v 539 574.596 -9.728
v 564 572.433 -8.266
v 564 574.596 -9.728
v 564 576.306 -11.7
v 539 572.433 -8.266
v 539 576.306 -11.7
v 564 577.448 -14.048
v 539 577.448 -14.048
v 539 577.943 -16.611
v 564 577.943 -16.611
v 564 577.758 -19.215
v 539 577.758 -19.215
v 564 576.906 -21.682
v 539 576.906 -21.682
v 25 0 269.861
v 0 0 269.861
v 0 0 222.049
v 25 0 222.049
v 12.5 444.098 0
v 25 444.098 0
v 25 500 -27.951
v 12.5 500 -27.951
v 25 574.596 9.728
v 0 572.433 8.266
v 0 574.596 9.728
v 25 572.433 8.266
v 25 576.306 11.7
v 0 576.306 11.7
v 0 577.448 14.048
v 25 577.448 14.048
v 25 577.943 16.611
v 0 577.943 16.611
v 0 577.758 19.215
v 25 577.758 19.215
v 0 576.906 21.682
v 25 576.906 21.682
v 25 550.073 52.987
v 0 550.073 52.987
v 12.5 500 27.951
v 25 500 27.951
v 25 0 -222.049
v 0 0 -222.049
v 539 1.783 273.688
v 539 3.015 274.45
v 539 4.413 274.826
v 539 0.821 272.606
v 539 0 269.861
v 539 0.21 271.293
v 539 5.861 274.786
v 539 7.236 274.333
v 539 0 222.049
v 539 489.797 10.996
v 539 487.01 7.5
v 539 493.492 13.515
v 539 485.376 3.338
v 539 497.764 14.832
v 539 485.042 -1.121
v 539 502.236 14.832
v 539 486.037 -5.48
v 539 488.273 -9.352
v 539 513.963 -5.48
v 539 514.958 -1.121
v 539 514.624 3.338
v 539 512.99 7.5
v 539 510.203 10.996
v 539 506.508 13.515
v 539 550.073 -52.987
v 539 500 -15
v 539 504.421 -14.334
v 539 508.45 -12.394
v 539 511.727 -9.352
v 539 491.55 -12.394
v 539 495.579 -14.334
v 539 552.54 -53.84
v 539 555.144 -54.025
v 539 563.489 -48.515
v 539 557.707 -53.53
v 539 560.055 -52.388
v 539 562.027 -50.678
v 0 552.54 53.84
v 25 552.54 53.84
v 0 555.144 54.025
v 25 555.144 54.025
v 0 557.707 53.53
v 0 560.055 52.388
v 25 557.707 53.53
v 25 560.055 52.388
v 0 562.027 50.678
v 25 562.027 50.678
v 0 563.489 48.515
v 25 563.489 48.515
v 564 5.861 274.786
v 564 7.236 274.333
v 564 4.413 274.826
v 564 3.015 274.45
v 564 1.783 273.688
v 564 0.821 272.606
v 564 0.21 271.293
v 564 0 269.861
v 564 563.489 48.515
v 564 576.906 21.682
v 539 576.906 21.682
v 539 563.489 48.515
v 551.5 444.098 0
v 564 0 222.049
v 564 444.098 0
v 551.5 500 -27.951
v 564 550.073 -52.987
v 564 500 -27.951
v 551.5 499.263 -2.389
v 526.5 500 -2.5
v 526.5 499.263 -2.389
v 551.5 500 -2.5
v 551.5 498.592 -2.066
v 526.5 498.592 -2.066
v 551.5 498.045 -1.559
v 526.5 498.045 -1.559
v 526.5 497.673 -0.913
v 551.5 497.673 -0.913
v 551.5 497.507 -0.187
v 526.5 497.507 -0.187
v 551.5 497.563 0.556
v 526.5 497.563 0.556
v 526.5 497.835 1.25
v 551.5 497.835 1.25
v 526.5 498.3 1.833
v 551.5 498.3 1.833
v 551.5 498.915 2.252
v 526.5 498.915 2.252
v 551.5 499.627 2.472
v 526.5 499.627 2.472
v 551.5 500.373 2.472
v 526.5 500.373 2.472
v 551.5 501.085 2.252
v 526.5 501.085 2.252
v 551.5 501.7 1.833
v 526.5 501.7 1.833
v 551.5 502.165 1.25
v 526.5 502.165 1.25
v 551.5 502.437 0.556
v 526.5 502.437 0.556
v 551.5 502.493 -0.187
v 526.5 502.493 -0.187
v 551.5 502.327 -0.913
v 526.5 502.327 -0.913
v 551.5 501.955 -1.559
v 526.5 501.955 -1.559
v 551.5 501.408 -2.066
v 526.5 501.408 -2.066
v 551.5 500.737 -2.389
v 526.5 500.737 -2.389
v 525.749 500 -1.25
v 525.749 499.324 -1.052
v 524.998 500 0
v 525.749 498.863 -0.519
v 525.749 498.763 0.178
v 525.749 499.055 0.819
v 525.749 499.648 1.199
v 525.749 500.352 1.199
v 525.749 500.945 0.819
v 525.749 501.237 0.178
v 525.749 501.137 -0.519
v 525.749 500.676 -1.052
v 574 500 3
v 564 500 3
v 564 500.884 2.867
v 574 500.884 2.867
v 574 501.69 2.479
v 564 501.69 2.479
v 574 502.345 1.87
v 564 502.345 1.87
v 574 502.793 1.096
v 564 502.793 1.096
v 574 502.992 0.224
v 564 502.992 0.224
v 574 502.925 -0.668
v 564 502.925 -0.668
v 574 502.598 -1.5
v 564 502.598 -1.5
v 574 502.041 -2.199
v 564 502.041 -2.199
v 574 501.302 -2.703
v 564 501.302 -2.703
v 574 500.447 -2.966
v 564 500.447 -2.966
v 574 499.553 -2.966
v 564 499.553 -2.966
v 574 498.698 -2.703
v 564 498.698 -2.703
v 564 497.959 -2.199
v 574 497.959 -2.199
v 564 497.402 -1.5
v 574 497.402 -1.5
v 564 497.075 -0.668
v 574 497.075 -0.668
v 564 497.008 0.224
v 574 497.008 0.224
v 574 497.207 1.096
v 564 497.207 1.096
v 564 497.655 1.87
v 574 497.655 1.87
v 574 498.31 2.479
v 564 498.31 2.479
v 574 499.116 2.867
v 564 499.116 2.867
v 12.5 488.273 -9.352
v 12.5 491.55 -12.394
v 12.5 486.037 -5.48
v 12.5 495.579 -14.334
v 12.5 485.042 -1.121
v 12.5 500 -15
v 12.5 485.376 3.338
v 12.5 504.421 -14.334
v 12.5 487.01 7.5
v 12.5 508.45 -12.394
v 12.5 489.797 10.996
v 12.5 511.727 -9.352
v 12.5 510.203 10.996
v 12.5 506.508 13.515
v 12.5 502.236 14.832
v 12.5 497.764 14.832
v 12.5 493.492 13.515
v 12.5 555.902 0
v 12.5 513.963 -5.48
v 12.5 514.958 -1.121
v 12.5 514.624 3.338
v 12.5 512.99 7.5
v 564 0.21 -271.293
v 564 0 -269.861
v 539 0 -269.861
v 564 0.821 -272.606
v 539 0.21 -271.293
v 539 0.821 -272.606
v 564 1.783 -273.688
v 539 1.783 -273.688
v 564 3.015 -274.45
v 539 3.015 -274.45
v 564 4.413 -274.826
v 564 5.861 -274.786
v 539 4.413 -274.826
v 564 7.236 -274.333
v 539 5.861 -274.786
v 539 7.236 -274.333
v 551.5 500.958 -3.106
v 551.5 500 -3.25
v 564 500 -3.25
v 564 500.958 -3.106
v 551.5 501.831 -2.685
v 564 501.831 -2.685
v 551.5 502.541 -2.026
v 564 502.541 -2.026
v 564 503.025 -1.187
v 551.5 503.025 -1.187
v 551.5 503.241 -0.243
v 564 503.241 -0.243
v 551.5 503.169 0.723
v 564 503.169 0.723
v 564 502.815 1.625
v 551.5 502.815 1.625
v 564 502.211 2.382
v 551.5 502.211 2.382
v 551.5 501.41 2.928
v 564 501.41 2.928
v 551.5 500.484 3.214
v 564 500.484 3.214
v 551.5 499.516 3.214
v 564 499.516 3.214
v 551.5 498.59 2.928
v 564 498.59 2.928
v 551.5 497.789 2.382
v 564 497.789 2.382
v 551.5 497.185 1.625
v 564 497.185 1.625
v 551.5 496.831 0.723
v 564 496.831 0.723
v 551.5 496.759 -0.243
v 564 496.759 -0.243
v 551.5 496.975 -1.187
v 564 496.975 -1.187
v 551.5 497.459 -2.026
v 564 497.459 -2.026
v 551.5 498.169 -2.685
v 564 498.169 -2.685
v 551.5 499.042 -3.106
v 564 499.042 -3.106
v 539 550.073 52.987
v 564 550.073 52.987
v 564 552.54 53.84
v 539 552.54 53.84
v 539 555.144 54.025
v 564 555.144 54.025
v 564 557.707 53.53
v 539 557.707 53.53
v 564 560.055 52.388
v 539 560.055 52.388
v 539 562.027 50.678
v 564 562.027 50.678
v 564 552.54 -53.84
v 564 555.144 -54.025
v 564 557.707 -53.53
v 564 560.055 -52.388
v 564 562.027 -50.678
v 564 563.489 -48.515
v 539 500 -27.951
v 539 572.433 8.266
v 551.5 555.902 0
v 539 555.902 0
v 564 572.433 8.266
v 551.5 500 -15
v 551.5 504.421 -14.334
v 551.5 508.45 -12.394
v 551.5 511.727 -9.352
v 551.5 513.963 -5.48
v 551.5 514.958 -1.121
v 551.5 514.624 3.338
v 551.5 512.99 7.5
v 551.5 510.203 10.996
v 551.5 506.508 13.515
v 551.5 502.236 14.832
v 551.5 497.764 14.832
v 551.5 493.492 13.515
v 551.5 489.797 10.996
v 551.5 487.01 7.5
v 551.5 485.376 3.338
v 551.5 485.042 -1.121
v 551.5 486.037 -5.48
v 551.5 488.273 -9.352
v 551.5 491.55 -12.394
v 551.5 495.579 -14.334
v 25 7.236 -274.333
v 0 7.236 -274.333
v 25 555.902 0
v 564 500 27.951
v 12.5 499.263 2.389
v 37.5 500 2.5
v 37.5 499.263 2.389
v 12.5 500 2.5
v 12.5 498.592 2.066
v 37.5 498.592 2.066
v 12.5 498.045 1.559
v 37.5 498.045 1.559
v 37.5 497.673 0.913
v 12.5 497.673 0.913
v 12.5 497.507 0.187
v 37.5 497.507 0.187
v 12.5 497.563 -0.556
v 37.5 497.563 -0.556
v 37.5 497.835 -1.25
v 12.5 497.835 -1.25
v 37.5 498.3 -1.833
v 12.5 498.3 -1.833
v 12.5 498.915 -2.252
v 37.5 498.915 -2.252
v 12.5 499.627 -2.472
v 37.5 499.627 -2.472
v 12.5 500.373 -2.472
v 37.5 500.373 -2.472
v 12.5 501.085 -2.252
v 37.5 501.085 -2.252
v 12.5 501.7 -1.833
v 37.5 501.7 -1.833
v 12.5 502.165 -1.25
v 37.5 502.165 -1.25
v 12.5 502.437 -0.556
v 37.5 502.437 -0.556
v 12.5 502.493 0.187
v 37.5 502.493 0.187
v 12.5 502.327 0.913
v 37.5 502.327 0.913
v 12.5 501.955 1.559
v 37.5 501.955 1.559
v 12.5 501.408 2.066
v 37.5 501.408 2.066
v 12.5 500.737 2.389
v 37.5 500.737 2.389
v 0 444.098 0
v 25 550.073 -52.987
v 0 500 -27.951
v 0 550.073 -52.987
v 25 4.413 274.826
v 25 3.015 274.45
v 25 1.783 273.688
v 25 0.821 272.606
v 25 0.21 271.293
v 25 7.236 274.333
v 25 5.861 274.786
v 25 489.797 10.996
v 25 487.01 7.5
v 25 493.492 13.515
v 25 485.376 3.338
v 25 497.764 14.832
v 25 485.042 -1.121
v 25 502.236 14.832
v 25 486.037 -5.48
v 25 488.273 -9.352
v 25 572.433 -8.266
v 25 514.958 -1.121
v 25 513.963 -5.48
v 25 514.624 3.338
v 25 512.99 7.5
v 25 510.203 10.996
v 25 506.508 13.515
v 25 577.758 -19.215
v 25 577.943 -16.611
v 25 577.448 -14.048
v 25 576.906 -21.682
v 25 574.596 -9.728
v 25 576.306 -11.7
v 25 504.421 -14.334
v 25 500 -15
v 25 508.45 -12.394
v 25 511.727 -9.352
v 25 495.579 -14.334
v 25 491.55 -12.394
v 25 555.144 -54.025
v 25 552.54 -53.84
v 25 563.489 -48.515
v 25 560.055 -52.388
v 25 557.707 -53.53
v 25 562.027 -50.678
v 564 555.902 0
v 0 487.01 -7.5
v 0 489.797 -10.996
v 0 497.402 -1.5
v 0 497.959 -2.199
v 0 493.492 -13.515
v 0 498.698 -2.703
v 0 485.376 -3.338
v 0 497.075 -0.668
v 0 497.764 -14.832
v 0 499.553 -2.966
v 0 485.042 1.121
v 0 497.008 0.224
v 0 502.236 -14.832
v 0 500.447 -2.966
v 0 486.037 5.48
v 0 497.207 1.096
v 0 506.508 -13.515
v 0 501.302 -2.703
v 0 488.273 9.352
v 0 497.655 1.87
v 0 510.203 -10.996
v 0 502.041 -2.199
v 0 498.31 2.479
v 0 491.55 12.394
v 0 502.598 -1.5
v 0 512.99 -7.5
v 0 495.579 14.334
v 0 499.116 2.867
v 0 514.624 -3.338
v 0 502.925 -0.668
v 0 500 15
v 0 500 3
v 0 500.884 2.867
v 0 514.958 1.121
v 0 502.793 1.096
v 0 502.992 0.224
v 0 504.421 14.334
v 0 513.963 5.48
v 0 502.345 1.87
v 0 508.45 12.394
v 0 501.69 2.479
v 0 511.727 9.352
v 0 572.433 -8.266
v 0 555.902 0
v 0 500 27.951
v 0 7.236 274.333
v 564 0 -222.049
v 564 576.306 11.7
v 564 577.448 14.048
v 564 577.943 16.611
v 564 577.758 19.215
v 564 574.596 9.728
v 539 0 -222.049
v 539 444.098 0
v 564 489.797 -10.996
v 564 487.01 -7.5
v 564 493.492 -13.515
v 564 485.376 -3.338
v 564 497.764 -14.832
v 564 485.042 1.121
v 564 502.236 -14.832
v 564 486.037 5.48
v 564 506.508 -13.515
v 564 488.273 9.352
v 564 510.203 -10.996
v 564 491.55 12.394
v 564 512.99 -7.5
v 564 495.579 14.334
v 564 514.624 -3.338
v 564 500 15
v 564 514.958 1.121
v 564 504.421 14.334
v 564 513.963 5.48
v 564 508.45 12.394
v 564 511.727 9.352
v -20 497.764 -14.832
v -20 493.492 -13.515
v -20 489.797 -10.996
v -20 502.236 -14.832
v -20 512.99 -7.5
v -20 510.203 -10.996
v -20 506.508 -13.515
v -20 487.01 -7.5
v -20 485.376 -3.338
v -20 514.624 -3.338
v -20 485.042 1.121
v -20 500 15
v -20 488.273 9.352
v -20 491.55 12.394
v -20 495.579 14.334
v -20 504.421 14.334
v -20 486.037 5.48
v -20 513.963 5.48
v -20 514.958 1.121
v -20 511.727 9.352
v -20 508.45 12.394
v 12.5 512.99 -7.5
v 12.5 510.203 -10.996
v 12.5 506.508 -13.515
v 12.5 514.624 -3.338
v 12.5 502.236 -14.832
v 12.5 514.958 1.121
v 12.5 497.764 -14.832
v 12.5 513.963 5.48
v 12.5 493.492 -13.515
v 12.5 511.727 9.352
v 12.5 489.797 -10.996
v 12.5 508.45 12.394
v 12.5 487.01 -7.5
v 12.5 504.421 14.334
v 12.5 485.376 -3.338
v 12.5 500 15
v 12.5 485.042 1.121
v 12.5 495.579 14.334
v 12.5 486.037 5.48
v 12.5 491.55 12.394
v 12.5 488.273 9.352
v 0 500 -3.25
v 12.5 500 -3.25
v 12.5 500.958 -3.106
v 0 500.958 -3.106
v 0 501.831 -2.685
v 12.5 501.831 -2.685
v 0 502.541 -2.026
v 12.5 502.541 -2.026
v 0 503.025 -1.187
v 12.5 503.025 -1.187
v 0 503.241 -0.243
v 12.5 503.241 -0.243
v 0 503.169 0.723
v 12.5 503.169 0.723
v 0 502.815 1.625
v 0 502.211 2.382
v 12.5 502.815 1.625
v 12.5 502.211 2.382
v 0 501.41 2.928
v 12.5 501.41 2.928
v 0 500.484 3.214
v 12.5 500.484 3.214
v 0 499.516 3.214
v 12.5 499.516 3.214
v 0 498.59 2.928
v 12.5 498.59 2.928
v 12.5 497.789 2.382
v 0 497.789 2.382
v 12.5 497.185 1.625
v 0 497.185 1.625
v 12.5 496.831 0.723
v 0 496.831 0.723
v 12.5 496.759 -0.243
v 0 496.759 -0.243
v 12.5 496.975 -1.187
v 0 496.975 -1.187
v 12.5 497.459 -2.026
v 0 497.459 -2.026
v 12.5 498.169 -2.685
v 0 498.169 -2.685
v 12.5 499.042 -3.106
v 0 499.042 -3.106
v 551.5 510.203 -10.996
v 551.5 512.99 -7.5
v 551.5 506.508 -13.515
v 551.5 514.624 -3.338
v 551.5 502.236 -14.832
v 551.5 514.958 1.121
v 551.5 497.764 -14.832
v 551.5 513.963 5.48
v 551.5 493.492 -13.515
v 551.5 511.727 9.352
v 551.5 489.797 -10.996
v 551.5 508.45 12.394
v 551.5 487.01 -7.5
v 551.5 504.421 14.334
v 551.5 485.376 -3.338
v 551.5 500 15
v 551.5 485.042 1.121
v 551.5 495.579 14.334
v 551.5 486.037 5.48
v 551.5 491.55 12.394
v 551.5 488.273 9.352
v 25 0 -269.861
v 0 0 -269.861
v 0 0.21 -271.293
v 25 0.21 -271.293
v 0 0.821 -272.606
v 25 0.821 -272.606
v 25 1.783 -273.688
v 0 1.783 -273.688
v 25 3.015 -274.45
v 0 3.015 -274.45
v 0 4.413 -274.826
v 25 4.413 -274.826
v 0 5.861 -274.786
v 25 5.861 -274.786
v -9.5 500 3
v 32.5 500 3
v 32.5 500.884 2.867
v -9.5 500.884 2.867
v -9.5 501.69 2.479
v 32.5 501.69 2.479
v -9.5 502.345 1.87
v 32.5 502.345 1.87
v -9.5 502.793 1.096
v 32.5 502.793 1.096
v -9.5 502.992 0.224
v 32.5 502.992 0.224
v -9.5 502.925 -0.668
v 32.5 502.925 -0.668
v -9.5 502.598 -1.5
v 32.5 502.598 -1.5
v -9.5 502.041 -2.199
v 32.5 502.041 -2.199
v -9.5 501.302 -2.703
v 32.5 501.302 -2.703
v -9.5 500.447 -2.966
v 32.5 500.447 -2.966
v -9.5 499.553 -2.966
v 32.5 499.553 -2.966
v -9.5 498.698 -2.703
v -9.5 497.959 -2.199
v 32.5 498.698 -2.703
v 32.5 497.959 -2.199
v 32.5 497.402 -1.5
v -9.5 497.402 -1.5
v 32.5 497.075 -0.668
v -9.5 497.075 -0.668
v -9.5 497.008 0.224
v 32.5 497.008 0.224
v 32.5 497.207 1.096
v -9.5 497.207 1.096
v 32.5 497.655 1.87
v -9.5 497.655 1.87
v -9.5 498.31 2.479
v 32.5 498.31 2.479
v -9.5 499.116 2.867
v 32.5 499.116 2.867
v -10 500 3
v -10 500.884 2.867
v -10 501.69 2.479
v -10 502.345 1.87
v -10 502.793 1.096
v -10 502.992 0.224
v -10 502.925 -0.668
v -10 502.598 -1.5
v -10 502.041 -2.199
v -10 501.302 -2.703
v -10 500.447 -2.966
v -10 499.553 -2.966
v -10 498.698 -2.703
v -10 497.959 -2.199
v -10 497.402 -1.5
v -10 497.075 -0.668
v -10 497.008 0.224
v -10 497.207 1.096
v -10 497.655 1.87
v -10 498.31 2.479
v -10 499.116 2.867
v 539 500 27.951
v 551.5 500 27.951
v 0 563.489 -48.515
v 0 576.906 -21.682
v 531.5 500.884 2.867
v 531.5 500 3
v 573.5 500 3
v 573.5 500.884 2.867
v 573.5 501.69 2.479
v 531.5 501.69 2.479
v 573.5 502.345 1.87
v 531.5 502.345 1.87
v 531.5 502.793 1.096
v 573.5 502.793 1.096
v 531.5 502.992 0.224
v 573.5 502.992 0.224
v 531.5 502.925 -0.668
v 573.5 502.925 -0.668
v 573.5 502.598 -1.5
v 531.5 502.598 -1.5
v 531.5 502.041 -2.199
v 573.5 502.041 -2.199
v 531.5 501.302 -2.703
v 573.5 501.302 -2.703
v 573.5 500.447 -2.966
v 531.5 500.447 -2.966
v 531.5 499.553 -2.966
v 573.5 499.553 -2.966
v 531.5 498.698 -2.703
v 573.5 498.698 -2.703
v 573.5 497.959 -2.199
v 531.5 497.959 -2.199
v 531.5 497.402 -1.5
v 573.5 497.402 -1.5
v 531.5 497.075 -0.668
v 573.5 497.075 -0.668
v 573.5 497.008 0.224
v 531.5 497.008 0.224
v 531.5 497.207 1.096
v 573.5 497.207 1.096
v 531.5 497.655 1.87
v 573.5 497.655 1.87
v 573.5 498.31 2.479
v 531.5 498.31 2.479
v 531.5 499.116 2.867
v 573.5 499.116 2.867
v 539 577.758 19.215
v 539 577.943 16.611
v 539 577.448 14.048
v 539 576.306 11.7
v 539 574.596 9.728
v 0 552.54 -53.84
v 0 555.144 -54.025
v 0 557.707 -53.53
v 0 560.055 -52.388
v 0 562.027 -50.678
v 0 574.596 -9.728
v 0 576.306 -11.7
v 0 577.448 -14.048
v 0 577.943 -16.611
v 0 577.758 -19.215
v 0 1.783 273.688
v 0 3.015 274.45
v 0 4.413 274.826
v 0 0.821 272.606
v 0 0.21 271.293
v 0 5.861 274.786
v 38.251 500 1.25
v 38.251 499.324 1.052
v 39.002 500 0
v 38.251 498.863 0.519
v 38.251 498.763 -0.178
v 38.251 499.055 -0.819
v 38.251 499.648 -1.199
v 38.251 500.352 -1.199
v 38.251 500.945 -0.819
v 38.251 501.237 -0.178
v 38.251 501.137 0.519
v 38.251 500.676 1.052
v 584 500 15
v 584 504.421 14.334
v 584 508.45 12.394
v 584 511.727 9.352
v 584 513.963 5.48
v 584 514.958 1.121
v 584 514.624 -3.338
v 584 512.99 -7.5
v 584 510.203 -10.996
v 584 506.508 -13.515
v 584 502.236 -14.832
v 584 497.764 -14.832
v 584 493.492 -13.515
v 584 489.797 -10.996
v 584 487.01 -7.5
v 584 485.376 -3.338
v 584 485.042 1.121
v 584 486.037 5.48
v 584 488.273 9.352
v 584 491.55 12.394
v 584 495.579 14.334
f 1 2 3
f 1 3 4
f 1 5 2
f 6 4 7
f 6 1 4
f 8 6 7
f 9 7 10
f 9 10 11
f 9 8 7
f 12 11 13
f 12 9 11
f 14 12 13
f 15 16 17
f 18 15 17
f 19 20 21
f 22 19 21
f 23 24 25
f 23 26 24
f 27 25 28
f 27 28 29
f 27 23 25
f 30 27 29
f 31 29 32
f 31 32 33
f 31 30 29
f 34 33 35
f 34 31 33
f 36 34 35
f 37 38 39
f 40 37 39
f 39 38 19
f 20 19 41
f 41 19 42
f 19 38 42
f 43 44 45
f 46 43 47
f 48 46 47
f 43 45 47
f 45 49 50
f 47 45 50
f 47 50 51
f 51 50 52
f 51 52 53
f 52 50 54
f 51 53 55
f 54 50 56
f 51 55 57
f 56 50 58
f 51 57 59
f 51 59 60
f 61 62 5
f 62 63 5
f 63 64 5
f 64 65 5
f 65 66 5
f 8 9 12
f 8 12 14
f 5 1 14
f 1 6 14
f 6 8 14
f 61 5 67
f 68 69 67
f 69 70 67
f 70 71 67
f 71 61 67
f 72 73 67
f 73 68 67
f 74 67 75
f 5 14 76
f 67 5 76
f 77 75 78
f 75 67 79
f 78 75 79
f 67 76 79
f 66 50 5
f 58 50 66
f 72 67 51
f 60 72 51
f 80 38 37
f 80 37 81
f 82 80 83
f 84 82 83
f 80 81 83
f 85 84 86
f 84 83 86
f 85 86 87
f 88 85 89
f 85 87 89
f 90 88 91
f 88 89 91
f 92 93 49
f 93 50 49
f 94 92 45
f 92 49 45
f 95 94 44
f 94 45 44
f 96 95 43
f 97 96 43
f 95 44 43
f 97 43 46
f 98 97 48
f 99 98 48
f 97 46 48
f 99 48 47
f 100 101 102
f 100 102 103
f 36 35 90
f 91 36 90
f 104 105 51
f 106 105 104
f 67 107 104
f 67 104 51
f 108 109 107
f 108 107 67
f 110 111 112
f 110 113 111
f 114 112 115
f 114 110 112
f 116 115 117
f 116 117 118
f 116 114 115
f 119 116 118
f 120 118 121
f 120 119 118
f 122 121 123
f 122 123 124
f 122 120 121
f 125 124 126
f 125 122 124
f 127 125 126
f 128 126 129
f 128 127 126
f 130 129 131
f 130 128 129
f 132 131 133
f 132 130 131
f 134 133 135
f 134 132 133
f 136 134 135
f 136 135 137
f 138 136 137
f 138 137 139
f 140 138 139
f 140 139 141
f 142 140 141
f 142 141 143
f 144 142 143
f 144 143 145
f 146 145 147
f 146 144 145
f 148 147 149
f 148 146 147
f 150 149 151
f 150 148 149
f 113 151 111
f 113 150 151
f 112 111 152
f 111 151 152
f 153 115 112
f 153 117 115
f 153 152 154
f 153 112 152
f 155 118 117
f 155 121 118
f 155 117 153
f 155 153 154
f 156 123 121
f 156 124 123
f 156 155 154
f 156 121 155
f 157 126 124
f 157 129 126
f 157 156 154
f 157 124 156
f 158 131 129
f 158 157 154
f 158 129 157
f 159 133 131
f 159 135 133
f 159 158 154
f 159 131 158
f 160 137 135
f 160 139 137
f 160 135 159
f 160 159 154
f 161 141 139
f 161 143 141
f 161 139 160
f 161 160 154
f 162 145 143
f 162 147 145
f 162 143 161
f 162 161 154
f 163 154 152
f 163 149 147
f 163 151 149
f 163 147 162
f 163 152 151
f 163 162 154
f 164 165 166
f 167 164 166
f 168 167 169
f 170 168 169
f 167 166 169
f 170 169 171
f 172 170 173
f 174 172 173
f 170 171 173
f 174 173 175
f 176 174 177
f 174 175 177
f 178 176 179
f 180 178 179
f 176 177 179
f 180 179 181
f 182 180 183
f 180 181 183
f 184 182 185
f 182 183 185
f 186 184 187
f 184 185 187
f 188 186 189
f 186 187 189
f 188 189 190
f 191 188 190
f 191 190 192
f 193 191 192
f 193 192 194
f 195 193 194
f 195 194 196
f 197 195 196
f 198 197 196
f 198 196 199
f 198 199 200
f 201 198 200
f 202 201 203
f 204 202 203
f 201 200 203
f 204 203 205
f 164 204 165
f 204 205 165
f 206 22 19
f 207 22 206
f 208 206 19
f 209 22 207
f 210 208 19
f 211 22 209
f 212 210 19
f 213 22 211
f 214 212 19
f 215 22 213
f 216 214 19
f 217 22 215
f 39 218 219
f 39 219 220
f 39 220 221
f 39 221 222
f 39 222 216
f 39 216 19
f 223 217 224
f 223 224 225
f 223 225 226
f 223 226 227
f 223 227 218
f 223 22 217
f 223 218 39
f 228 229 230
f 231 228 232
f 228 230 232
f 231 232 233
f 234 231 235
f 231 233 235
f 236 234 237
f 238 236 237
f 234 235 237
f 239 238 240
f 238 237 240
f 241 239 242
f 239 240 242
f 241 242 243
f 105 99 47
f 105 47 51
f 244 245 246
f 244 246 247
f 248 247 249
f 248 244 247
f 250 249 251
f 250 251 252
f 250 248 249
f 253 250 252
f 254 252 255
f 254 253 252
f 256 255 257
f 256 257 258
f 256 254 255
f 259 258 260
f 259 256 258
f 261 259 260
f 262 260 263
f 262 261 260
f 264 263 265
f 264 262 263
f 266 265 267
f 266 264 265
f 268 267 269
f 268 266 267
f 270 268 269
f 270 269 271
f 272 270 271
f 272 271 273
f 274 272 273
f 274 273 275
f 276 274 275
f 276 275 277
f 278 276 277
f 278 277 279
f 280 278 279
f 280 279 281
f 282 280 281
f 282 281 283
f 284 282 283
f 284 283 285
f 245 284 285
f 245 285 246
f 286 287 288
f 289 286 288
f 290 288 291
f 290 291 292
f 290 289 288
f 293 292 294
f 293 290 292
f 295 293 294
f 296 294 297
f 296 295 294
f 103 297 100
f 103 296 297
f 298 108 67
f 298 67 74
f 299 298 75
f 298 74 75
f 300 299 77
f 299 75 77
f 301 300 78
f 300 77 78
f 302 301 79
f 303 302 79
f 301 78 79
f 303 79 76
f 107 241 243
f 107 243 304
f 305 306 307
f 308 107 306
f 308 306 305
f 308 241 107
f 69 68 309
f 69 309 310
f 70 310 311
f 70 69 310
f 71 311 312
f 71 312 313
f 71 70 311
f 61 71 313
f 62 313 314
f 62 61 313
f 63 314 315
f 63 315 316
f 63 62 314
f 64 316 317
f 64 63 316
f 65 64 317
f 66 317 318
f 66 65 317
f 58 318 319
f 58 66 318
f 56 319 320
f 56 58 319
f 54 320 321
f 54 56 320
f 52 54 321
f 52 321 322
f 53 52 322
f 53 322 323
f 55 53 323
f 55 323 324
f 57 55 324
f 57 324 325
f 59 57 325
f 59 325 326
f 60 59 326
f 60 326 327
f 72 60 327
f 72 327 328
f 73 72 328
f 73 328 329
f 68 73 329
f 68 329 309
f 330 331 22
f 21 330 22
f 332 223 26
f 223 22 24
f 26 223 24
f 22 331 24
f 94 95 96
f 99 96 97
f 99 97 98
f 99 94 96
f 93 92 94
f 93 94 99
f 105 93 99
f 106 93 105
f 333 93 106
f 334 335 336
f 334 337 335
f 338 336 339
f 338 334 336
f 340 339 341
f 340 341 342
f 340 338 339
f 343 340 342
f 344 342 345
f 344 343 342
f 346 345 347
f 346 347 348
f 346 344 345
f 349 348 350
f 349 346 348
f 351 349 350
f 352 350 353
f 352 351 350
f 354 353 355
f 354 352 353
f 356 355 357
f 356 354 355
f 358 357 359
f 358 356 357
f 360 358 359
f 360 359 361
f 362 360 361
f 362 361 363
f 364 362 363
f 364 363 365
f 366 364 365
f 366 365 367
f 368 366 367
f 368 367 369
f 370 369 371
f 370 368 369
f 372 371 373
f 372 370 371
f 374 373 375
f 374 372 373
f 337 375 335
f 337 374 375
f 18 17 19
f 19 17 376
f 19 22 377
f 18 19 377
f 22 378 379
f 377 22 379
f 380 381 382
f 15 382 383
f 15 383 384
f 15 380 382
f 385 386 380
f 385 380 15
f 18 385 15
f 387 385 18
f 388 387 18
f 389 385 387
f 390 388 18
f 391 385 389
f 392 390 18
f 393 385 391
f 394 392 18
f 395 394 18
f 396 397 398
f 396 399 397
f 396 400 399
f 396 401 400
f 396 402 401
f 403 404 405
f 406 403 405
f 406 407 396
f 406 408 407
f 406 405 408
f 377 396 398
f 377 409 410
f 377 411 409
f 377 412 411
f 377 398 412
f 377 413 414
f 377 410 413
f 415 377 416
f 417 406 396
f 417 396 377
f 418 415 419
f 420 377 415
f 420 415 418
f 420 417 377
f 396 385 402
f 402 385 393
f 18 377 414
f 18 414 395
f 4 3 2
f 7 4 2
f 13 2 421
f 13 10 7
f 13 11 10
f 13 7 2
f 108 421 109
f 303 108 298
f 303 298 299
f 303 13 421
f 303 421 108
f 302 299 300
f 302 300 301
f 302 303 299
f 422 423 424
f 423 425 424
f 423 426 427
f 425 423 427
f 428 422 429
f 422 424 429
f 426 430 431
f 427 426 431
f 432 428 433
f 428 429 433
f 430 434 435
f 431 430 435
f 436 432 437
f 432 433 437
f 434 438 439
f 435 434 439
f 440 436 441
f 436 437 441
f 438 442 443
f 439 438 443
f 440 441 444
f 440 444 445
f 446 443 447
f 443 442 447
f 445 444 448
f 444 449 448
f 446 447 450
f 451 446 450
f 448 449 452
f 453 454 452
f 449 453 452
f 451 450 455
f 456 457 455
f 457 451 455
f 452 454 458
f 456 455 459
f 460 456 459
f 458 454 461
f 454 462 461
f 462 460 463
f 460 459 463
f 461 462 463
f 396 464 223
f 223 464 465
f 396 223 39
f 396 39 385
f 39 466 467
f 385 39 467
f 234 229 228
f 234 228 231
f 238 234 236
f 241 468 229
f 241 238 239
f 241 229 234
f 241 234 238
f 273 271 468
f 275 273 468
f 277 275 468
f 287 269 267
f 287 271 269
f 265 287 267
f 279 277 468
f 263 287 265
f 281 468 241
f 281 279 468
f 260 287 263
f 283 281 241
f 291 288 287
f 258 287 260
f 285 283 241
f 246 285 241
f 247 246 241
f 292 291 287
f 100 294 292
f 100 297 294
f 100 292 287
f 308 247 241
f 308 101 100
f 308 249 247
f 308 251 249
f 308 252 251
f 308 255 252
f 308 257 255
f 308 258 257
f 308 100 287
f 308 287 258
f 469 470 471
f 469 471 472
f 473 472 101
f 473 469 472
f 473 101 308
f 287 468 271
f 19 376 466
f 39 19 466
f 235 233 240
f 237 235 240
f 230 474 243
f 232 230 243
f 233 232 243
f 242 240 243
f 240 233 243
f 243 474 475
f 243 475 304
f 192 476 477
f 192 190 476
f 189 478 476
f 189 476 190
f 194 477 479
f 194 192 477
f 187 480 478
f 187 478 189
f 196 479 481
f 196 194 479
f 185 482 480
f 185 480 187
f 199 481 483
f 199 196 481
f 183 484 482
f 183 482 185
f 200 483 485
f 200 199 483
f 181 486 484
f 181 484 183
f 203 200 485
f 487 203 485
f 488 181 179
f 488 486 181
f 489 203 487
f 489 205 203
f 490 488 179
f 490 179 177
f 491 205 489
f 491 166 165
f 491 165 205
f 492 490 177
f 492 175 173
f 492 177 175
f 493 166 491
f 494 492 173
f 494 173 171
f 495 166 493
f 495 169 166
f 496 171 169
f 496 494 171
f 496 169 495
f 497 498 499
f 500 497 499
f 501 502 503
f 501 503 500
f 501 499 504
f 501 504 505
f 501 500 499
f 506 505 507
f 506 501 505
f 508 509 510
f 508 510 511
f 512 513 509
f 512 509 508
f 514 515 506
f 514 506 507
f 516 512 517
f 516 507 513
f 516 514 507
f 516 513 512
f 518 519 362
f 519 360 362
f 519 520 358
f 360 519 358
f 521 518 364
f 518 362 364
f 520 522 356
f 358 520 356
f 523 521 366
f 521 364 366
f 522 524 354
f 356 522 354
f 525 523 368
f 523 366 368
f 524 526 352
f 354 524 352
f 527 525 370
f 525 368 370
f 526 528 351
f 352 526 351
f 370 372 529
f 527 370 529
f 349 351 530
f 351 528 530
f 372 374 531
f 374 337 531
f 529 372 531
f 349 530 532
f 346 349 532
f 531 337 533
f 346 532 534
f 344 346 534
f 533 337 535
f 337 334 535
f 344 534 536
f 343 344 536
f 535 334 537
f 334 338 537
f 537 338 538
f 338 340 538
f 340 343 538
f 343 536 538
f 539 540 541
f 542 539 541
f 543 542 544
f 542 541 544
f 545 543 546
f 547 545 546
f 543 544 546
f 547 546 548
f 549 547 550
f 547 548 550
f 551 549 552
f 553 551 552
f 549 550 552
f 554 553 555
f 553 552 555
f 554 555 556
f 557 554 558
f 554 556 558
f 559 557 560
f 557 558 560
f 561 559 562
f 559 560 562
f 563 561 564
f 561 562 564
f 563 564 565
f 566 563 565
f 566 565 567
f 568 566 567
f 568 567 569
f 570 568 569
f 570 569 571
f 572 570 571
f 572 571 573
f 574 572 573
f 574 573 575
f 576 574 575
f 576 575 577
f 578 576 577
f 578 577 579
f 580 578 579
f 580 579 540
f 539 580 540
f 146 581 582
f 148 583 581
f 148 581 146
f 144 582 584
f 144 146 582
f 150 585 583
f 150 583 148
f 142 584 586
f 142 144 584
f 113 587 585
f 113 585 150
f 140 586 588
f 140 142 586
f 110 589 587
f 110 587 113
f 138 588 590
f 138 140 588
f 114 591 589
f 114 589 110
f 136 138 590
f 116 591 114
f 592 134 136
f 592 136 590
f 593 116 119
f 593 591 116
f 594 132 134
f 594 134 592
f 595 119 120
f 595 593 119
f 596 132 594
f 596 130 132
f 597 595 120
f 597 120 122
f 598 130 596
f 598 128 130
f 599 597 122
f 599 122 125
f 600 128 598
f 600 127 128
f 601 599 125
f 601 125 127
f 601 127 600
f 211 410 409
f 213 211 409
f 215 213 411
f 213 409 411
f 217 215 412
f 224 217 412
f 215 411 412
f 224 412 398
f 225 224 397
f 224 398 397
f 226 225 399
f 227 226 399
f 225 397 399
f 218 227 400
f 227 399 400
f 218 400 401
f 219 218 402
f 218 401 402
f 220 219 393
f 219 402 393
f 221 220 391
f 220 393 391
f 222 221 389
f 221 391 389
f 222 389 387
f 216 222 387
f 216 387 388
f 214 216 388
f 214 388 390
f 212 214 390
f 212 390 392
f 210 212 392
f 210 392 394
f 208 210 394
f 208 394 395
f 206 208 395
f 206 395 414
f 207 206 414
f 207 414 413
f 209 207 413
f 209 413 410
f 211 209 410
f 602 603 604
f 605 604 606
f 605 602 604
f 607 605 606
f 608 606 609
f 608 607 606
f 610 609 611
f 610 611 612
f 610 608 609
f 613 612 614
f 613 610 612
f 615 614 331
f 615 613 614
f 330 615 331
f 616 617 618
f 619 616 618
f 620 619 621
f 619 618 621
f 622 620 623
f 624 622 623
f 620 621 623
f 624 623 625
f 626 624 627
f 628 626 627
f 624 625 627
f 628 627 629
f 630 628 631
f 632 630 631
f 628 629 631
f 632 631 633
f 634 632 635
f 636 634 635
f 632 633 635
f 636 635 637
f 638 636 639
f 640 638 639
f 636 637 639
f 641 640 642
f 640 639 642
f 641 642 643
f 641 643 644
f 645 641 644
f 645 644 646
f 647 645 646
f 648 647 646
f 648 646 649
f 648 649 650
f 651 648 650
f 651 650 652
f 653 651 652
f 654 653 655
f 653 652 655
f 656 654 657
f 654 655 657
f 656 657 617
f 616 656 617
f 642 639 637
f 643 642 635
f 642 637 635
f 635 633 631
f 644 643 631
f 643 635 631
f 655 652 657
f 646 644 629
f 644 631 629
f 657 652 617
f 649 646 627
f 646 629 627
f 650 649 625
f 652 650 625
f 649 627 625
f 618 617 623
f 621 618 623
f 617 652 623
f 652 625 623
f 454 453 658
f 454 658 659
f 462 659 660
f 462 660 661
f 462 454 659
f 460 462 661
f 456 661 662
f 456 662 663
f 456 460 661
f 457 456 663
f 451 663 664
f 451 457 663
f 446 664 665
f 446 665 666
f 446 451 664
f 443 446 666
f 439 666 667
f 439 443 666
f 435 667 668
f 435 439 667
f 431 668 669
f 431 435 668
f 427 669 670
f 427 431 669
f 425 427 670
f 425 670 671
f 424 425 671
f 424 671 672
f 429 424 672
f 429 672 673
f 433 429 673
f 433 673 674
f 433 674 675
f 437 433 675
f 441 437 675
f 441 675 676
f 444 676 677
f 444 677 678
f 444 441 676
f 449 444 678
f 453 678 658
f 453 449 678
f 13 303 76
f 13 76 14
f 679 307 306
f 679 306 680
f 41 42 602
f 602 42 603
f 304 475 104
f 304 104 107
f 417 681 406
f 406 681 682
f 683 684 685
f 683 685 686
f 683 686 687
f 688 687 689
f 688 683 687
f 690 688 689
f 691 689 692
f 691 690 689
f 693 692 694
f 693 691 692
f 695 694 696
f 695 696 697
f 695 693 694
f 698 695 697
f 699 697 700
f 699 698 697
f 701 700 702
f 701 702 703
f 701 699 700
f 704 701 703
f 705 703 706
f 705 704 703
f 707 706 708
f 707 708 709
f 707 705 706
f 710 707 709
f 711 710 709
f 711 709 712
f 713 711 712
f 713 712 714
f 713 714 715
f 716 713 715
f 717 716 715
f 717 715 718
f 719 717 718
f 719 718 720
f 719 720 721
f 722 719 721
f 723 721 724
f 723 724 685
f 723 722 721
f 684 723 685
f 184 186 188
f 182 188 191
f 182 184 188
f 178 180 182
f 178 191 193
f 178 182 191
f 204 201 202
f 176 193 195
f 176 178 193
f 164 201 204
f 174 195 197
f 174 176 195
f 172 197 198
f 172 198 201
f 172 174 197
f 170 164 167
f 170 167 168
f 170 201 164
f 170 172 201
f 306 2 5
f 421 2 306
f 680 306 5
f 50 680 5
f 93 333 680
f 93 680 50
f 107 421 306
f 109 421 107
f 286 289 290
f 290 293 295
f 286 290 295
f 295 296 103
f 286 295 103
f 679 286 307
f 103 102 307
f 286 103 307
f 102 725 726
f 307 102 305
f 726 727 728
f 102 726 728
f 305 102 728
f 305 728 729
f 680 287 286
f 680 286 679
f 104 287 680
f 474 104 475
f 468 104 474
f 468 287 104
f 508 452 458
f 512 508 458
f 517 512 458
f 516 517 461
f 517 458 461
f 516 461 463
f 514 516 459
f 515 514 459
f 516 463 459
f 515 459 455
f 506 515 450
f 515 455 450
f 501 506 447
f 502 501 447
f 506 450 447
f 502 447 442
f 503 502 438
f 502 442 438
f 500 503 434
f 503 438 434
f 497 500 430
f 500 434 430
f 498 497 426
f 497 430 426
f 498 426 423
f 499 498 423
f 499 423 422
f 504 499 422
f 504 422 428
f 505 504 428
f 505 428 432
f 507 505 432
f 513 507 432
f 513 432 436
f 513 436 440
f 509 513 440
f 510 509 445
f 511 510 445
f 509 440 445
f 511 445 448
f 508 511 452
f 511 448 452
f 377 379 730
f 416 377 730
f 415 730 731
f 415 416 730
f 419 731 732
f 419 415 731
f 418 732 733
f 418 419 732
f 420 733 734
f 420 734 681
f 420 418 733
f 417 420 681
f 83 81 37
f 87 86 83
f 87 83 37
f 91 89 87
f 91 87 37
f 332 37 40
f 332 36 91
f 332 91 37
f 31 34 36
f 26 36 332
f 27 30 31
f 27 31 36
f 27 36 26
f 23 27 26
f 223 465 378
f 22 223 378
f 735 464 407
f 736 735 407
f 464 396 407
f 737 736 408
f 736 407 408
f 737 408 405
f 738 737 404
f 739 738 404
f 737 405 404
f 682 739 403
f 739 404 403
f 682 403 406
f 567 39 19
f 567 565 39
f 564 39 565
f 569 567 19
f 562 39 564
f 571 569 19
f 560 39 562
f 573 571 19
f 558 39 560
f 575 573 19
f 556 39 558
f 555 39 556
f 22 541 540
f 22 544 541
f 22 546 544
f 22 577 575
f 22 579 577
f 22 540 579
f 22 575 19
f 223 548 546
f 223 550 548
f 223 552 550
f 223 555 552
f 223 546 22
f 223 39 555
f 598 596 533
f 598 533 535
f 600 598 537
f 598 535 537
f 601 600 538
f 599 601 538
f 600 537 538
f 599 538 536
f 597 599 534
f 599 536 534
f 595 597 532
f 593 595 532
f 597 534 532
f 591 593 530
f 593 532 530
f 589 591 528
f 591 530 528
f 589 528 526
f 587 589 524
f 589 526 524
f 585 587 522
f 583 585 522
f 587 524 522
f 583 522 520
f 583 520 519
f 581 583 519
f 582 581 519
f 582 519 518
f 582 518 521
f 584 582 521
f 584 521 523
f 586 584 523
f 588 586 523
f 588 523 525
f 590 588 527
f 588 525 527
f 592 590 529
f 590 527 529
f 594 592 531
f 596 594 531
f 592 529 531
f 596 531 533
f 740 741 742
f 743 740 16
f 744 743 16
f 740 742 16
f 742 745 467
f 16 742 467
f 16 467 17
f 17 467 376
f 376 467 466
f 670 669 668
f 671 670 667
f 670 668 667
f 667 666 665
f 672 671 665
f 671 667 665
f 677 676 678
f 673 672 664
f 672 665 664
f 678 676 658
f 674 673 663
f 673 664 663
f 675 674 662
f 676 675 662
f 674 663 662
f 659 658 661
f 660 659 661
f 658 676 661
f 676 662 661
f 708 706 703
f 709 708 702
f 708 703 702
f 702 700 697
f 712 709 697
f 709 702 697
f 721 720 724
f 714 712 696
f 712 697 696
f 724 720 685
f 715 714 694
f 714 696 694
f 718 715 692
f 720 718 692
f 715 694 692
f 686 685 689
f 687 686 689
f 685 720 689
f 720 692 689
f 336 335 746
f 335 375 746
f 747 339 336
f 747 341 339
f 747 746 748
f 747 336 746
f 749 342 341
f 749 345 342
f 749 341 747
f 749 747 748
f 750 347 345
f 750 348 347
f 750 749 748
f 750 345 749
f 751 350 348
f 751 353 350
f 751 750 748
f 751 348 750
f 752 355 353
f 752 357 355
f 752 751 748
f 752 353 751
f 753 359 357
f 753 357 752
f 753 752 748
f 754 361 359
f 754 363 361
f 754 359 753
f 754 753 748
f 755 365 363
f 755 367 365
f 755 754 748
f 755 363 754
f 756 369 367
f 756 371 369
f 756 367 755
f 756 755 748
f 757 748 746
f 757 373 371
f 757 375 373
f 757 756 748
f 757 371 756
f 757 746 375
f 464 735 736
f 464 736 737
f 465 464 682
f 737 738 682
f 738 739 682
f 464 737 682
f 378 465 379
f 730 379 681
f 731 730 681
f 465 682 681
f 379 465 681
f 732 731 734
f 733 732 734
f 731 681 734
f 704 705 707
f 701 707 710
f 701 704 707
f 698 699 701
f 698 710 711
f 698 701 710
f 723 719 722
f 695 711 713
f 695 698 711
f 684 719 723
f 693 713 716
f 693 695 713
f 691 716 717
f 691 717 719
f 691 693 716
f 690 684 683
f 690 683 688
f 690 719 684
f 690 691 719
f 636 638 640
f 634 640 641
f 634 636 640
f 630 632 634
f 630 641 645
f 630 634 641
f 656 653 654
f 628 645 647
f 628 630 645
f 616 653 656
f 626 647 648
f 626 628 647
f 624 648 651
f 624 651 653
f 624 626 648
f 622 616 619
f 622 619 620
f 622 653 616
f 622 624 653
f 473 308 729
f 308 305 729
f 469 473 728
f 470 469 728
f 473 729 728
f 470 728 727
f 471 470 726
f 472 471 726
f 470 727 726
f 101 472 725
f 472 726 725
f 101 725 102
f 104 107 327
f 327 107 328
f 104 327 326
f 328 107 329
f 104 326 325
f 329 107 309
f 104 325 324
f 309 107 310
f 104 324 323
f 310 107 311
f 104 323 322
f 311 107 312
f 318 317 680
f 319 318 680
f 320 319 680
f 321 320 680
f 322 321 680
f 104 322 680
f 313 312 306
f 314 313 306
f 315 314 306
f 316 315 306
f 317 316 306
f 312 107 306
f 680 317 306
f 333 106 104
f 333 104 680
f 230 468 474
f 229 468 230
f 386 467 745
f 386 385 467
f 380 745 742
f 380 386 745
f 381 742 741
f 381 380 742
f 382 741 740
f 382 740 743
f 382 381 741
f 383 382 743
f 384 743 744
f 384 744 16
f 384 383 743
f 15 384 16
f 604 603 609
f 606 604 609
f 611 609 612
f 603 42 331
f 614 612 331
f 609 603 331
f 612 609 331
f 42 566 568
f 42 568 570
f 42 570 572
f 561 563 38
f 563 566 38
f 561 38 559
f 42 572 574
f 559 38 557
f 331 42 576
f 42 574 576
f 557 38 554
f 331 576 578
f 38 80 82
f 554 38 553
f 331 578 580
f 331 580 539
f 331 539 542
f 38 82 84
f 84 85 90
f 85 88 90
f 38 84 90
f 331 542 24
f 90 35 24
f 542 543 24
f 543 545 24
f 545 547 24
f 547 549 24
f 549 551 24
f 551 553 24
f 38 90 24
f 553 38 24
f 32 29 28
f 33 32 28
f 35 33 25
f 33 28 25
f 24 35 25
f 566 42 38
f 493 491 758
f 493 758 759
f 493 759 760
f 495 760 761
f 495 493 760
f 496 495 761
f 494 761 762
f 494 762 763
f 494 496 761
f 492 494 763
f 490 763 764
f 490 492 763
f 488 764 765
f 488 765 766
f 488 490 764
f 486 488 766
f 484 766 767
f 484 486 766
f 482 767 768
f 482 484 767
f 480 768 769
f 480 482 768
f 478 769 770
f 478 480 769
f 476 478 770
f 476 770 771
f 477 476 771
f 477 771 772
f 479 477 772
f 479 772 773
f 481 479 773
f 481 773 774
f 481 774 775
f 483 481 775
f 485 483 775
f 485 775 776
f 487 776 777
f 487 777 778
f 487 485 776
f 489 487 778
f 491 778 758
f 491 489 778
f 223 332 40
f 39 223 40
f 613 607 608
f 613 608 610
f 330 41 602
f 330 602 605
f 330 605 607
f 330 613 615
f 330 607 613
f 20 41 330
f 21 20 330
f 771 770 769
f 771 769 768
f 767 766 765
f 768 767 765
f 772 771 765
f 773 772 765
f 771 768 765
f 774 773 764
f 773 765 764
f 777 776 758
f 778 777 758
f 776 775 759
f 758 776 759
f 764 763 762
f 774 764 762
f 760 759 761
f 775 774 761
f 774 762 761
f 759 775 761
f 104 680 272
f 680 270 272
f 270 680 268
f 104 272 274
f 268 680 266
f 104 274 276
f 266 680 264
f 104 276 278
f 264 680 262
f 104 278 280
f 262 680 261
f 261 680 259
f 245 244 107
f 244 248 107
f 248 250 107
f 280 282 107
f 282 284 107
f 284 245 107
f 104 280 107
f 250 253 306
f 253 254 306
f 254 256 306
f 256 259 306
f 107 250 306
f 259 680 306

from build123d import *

# Parameters (mm, degrees)
BOSS_EXTRUDE1_DEPTH      = 25
BOSS_EXTRUDE2_DEPTH      = 25
CUT_EXTRUDE1_DEPTH       = 12.5
CUT_EXTRUDE2_DEPTH       = 12.5
SKETCH8_R                = 15
CUT_EXTRUDE3_DEPTH       = 645.888885669
SKETCH9_R                = 3.25
CUT_EXTRUDE4_DEPTH       = 645.888885669
FILLET1_R                = 10
FILLET2_R                = 10
FILLET3_R                = 5
FILLET4_R                = 5
SKETCH10_R               = 15
BOSS_EXTRUDE4_DEPTH      = 539
BOSS_EXTRUDE5_DEPTH      = 22
BOSS_EXTRUDE5_DEPTH_BACK = 20
SKETCH17_R               = 3
SKETCH18_R               = 15
BOSS_EXTRUDE6_DEPTH      = 20
SKETCH19_R               = 3
CUT_EXTRUDE5_DEPTH       = 10


with BuildPart() as part:
    # Sketch4 → Boss-Extrude1 (new body)
    with BuildSketch(Plane(origin=(0, 0, 0), x_dir=(0, 0, -1), z_dir=(1, 0, 0))):
        Polygon((-277.950849719, 0), (-222.049150281, 0), (57.459346906, 559.016994375), (12.737987356, 581.37767415), align=None)
    extrude(amount=BOSS_EXTRUDE1_DEPTH)

    # Sketch6 → Cut-Extrude1 (cut)
    with BuildSketch(Plane.ZY):
        Polygon((12.737987356, 581.37767415), (-277.950849719, 0), (-222.049150281, 0), (57.459346906, 559.016994375), align=None)
    extrude(amount=-CUT_EXTRUDE1_DEPTH, mode=Mode.SUBTRACT)

    # Sketch8 → Cut-Extrude3 (cut, through all)
    with BuildSketch(Plane(origin=(25, 0, 0), x_dir=(0, 0, -1), z_dir=(1, 0, 0))):
        with Locations((0, 500)):
            Circle(SKETCH8_R)
    extrude(amount=-CUT_EXTRUDE3_DEPTH, mode=Mode.SUBTRACT)

    # Fillet2
    fillet2_edges = [part.edges().sort_by_distance(p)[0] for p in [
        (12.5, 581.37767415, -12.737987356),
        (12.5, 559.016994375, -57.459346906),
    ]]
    fillet(fillet2_edges, radius=FILLET2_R)

    # Fillet3
    fillet3_edges = [part.edges().sort_by_distance(p)[0] for p in [
        (12.5, 0, 277.950849719),
    ]]
    fillet(fillet3_edges, radius=FILLET3_R)


with BuildPart() as body_2:
    # Sketch5 → Boss-Extrude2 (new body)
    with BuildSketch(Plane(origin=(0, 0, 0), x_dir=(0, 0, -1), z_dir=(1, 0, 0))):
        Polygon((222.049150281, 0), (277.950849719, 0), (-12.737987356, 581.37767415), (-57.459346906, 559.016994375), align=None)
    extrude(amount=BOSS_EXTRUDE2_DEPTH)

    # Sketch7 → Cut-Extrude2 (cut)
    with BuildSketch(Plane(origin=(25, 0, 0), x_dir=(0, 0, -1), z_dir=(1, 0, 0))):
        Polygon((12.737987356, 581.37767415), (-277.950849719, 0), (-222.049150281, 0), (57.459346906, 559.016994375), align=None)
    extrude(amount=-CUT_EXTRUDE2_DEPTH, mode=Mode.SUBTRACT)

    # Sketch9 → Cut-Extrude4 (cut, through all)
    with BuildSketch(Plane(origin=(25, 0, 0), x_dir=(0, 0, -1), z_dir=(1, 0, 0))):
        with Locations((0, 500)):
            Circle(SKETCH9_R)
    extrude(amount=-CUT_EXTRUDE4_DEPTH, mode=Mode.SUBTRACT)

    # Fillet1
    fillet1_edges = [body_2.edges().sort_by_distance(p)[0] for p in [
        (12.5, 559.016994375, 57.459346906),
        (12.5, 581.37767415, 12.737987356),
    ]]
    fillet(fillet1_edges, radius=FILLET1_R)

    # Fillet4
    fillet4_edges = [body_2.edges().sort_by_distance(p)[0] for p in [
        (12.5, 0, -277.950849719),
    ]]
    fillet(fillet4_edges, radius=FILLET4_R)


with BuildPart() as body_3:
    # Mirror1: mirrored copy
    add(part.part.mirror(Plane(origin=(282, 0, 0), x_dir=(0, 0, 1), z_dir=(1, 0, 0))))


with BuildPart() as body_4:
    # Mirror1 2: mirrored copy
    add(body_2.part.mirror(Plane(origin=(282, 0, 0), x_dir=(0, 0, 1), z_dir=(1, 0, 0))))


with BuildPart() as body_5:
    # Sketch10 → Boss-Extrude4 (new body)
    with BuildSketch(Plane(origin=(12.5, 0, 0), x_dir=(0, 0, -1), z_dir=(1, 0, 0))):
        with Locations(Location((0, 500, 0), (0, 0, 180))):
            Circle(SKETCH10_R)
    extrude(amount=BOSS_EXTRUDE4_DEPTH)

    # Sketch14 → M6 Tapped Hole1 (revolve, cut)
    with BuildSketch(Plane(origin=(12.5, 500, 0), x_dir=(0, 0, 1), z_dir=(0, 1, 0))):
        Polygon((0, 0), (0, 26.502151548), (2.5, 25), (2.5, 0), align=None)
    revolve(axis=Axis((6.15, 500, 0), (1, 0, 0)), mode=Mode.SUBTRACT)

    # Sketch16 → M6 Tapped Hole2 (revolve, cut)
    with BuildSketch(Plane(origin=(551.5, 500, 0), x_dir=(0, 0, -1), z_dir=(0, 1, 0))):
        Polygon((0, 0), (0, 26.502151548), (2.5, 25), (2.5, 0), align=None)
    revolve(axis=Axis((557.85, 500, 0), (-1, 0, 0)), mode=Mode.SUBTRACT)


with BuildPart() as body_6:
    # Sketch17 → Boss-Extrude5 (new, two sides: drawn at the far end of the back side and taken through both)
    with BuildSketch(Plane.ZY.offset(-12.5).offset(-BOSS_EXTRUDE5_DEPTH_BACK)):
        with Locations((0, 500)):
            Circle(SKETCH17_R)
    extrude(amount=BOSS_EXTRUDE5_DEPTH + BOSS_EXTRUDE5_DEPTH_BACK)


with BuildPart() as body_7:
    # Mirror3: mirrored copy
    add(body_6.part.mirror(Plane(origin=(282, 0, 0), x_dir=(0, 0, 1), z_dir=(1, 0, 0))))


with BuildPart() as body_8:
    # Sketch18 → Boss-Extrude6 (new body)
    with BuildSketch(Plane.ZY):
        with Locations((0, 500)):
            Circle(SKETCH18_R)
    extrude(amount=BOSS_EXTRUDE6_DEPTH)

    # Sketch19 → Cut-Extrude5 (cut)
    with BuildSketch(Plane.ZY):
        with Locations((0, 500)):
            Circle(SKETCH19_R)
    extrude(amount=CUT_EXTRUDE5_DEPTH, mode=Mode.SUBTRACT)


with BuildPart() as body_9:
    # Mirror4: mirrored copy
    add(body_8.part.mirror(Plane(origin=(282, 0, 0), x_dir=(0, 0, 1), z_dir=(1, 0, 0))))


solid = Compound([part.part, body_2.part, body_3.part, body_4.part, body_5.part, body_6.part, body_7.part, body_8.part, body_9.part])
